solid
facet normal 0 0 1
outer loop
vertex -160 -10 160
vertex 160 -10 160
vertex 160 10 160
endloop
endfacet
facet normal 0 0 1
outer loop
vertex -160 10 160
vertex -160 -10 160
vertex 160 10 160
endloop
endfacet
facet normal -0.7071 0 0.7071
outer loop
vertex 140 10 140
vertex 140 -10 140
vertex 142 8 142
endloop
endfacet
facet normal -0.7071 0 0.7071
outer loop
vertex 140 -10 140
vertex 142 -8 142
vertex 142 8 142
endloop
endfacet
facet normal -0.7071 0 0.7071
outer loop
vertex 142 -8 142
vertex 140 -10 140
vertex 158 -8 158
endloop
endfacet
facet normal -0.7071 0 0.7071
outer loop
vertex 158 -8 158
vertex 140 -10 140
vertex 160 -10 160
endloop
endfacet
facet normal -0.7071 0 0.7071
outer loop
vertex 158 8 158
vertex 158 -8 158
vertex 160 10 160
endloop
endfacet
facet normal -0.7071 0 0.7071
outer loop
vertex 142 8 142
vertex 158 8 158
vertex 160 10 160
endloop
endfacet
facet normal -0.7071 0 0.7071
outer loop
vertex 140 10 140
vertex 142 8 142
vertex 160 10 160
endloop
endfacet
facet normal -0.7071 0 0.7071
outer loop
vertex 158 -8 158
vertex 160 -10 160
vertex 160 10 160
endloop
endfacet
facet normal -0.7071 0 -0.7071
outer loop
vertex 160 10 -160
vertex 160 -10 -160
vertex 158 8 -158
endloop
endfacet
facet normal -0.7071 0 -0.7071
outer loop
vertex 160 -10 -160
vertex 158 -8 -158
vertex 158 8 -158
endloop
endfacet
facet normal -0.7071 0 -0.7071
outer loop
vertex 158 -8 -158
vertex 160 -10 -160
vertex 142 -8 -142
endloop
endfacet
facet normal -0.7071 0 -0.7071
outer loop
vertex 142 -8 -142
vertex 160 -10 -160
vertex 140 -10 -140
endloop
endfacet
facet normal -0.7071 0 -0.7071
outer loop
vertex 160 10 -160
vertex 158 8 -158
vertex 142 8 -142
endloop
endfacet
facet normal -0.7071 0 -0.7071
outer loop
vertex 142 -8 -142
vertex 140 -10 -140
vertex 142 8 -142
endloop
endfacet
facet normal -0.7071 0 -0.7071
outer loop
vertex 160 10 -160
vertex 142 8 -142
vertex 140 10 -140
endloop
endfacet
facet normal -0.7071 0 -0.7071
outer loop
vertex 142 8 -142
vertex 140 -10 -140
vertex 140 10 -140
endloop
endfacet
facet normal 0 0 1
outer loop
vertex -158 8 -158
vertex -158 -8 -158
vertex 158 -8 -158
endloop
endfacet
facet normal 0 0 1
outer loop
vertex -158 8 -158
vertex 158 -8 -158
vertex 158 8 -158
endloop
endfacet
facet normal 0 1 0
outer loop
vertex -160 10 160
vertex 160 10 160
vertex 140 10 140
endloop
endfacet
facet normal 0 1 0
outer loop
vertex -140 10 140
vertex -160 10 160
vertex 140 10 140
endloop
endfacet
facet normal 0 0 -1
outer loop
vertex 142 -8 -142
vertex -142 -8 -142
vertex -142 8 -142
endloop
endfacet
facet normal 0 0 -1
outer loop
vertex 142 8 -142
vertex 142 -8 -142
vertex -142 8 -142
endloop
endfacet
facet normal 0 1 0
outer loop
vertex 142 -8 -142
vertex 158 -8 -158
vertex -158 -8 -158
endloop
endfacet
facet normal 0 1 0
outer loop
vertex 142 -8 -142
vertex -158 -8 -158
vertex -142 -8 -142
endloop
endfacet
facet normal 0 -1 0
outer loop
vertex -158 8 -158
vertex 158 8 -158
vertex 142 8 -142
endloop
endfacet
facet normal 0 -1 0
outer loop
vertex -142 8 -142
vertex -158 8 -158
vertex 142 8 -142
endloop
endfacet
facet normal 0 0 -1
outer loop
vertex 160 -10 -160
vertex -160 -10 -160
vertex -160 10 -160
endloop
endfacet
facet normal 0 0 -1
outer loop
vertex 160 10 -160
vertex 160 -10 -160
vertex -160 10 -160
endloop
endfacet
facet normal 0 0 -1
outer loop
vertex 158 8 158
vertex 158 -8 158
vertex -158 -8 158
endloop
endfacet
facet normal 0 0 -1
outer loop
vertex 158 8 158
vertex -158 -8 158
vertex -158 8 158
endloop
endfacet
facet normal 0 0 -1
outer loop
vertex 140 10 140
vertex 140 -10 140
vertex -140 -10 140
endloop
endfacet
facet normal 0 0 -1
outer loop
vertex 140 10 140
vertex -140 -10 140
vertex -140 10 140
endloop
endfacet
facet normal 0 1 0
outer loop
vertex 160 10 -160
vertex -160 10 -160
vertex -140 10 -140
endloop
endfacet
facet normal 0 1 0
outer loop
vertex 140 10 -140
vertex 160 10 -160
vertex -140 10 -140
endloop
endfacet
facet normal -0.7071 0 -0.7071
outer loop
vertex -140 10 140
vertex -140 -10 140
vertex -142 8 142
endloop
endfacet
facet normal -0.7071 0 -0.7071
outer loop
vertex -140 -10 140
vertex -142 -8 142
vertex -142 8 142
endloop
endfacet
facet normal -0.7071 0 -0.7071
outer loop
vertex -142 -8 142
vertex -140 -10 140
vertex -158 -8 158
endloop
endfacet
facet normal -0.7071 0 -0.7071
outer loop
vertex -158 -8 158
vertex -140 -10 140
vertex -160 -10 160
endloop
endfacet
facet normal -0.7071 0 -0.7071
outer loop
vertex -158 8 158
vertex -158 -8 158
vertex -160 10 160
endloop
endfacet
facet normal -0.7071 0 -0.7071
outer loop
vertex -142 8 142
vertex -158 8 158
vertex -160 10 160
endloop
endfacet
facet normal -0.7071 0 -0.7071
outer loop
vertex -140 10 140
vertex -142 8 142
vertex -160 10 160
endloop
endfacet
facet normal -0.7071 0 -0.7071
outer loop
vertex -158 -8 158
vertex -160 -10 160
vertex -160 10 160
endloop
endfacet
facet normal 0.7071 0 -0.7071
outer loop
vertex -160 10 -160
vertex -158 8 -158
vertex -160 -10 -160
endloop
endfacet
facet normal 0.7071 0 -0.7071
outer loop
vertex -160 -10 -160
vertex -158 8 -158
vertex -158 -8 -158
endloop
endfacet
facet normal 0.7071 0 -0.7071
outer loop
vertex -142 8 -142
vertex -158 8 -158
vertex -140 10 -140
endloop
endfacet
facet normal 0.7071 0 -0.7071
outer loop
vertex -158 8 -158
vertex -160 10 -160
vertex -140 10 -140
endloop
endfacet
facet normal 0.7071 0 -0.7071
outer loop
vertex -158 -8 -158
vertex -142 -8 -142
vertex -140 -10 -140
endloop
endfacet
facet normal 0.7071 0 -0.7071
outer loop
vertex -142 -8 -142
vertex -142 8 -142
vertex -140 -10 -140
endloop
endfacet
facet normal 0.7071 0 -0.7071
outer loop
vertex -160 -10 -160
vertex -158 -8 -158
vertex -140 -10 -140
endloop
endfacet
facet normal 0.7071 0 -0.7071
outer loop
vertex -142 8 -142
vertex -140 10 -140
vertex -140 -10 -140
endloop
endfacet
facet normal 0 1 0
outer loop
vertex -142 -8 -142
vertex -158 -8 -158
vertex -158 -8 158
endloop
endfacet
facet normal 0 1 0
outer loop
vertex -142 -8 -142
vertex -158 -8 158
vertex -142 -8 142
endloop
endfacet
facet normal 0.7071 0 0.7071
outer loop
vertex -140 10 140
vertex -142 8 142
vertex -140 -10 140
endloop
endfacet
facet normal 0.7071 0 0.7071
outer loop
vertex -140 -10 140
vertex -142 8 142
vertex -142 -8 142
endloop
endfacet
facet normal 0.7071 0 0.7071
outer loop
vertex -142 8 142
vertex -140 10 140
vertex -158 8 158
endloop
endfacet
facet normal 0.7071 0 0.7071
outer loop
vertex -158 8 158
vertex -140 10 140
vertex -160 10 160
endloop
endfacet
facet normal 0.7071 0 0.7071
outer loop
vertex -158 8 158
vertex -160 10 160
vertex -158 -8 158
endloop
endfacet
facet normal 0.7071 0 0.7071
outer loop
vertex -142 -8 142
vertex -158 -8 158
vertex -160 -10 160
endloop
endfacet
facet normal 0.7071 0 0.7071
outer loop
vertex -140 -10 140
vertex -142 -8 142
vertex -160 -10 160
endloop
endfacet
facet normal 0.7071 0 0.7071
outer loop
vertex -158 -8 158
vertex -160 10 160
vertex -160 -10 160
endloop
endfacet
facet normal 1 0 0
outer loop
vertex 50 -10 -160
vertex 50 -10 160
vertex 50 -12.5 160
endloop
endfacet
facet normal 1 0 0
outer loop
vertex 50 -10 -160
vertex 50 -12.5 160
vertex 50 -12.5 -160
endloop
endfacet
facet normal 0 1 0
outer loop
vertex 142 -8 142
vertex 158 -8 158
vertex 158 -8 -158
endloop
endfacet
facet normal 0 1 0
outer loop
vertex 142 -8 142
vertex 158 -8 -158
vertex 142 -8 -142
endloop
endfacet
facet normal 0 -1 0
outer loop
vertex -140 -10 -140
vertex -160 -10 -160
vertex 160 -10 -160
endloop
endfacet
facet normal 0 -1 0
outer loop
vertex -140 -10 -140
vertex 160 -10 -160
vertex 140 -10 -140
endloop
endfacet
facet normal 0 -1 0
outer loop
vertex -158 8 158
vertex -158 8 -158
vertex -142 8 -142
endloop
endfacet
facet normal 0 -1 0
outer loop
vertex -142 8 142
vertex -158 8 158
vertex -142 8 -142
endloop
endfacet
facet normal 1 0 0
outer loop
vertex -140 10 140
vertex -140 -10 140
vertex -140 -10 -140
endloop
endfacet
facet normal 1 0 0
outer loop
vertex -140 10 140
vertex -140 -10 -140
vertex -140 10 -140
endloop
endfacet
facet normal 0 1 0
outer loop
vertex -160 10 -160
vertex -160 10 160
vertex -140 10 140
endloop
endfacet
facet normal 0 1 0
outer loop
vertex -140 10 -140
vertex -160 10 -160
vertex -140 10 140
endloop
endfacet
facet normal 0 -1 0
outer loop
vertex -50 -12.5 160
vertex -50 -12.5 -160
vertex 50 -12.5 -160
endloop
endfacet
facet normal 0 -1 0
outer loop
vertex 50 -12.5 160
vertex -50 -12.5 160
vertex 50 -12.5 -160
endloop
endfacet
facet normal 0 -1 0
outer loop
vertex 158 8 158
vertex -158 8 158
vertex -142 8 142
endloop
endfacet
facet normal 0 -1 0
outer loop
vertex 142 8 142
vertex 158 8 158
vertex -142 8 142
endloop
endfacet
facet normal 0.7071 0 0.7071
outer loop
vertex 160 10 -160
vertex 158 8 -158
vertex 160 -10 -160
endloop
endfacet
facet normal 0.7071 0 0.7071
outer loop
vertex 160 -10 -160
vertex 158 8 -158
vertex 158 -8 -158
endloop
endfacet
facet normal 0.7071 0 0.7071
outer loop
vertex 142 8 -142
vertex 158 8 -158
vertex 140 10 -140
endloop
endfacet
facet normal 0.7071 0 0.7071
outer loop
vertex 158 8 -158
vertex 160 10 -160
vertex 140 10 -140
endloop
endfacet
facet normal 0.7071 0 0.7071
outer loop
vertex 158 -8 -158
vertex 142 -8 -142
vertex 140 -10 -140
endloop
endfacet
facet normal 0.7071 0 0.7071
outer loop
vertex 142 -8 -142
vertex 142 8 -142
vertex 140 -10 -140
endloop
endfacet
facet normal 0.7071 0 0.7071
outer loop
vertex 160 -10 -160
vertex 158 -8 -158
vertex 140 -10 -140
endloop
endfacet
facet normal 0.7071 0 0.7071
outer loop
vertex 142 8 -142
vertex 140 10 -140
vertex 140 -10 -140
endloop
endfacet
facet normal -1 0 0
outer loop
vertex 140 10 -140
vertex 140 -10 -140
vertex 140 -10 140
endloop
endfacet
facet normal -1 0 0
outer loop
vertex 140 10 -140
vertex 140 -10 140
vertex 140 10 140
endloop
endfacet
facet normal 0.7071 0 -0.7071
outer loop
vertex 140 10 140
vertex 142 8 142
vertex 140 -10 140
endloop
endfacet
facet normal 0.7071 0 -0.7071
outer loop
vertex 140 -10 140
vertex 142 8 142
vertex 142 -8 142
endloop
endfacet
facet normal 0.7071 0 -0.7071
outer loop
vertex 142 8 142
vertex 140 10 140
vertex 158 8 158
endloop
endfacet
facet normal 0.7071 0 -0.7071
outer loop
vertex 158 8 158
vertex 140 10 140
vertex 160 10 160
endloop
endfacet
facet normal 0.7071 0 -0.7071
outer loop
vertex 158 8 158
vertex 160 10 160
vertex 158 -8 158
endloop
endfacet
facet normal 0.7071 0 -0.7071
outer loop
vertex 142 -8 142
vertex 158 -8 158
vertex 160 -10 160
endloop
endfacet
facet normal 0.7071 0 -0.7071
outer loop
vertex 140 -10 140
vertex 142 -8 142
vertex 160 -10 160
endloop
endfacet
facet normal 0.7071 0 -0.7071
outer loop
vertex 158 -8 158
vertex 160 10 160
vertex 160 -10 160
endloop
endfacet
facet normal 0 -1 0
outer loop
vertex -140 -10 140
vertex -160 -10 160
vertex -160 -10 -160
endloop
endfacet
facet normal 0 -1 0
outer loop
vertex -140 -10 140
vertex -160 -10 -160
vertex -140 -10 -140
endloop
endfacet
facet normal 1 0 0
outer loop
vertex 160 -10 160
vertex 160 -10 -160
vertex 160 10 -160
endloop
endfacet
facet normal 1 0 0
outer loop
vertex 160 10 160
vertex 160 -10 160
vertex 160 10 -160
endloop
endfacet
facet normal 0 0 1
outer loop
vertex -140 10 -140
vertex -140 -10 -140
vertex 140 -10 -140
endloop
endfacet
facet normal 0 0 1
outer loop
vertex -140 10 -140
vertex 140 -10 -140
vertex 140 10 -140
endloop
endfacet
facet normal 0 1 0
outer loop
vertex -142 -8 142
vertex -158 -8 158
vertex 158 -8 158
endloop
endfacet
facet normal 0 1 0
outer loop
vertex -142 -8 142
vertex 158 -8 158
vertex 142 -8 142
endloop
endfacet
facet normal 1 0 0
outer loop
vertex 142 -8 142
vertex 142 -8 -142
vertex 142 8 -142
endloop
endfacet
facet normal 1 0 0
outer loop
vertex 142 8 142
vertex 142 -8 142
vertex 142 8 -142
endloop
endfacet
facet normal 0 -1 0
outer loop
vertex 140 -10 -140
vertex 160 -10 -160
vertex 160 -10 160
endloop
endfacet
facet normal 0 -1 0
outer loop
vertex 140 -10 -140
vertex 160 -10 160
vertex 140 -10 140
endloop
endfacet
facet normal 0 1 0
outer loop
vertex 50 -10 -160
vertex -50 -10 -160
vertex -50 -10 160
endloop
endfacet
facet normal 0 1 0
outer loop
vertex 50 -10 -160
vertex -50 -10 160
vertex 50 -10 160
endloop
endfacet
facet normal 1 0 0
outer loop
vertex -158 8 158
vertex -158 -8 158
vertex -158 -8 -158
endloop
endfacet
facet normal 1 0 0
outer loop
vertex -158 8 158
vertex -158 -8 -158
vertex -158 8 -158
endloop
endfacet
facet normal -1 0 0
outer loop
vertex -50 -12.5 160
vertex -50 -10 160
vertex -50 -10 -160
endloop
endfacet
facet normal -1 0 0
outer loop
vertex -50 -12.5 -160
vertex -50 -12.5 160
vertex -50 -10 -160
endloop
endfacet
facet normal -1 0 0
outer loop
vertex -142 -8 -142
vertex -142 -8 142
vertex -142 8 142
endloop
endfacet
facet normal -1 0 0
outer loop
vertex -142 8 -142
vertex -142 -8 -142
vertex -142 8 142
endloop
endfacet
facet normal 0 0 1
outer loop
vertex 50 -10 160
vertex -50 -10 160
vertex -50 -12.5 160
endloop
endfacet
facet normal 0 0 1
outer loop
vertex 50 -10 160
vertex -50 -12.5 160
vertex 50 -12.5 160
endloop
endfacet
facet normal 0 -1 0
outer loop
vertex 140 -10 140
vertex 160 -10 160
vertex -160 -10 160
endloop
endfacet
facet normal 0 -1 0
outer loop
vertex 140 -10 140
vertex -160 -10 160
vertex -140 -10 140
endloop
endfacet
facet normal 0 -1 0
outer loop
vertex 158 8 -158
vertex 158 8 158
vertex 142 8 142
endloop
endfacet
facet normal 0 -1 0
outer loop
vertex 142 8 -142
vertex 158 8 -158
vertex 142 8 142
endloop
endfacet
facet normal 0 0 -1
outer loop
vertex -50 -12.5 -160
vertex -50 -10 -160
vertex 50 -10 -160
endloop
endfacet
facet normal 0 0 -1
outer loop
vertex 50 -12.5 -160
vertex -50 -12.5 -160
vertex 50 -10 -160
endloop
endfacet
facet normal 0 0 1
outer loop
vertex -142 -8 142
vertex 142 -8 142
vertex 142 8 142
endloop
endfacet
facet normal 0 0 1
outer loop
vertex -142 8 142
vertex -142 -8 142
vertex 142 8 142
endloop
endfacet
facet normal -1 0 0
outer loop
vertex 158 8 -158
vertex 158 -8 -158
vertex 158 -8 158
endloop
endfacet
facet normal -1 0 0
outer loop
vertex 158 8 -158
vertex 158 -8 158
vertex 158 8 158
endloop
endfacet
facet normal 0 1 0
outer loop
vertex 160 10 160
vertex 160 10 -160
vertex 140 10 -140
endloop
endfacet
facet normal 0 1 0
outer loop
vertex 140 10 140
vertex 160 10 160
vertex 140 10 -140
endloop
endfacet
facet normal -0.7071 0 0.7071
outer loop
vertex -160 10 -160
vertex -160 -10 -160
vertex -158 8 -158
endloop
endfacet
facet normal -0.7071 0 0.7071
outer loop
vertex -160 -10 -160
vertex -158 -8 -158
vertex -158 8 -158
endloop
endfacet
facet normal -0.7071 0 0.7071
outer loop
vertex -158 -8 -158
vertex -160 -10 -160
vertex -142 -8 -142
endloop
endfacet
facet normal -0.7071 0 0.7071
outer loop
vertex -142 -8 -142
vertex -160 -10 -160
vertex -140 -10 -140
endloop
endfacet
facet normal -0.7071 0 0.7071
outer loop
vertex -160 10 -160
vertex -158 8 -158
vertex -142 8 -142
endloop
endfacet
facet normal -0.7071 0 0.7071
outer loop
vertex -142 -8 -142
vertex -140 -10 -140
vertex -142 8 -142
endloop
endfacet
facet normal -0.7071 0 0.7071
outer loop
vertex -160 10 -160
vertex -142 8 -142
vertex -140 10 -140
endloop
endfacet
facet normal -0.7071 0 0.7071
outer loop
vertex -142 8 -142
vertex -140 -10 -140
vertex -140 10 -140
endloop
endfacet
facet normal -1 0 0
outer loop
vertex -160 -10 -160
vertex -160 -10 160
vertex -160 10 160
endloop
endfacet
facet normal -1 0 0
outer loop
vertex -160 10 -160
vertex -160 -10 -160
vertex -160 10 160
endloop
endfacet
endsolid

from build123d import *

# Parameters (mm, degrees)
TUBO_CUADRADO_20_X_20_X_2_2_DEPTH      = 315.142135624
TUBO_CUADRADO_20_X_20_X_2_2_DEPTH_BACK = 15.142135624
SKETCH1_W                              = 20
SKETCH1_H                              = 20
SKETCH1_W_2                            = 16
SKETCH1_H_2                            = 16
SKETCH1_ON_SEGMENT_2_W                 = 20
SKETCH1_ON_SEGMENT_2_H                 = 20
SKETCH1_ON_SEGMENT_2_W_2               = 16
SKETCH1_ON_SEGMENT_2_H_2               = 16
TUBO_CUADRADO_20_X_20_X_2_2_2_DEPTH    = 330.284271247
SKETCH1_ON_SEGMENT_3_W                 = 20
SKETCH1_ON_SEGMENT_3_H                 = 20
SKETCH1_ON_SEGMENT_3_W_2               = 16
SKETCH1_ON_SEGMENT_3_H_2               = 16
TUBO_CUADRADO_20_X_20_X_2_2_3_DEPTH    = 330.284271247
SKETCH1_ON_SEGMENT_4_W                 = 20
SKETCH1_ON_SEGMENT_4_H                 = 20
SKETCH1_ON_SEGMENT_4_W_2               = 16
SKETCH1_ON_SEGMENT_4_H_2               = 16
TUBO_CUADRADO_20_X_20_X_2_2_4_DEPTH    = 330.284271247
CROQUIS3_W                             = 100
CROQUIS3_H                             = 320
SALIENTE_EXTRUIR1_DEPTH                = 2.5


with BuildPart() as part:
    # Sketch1 → Tubo cuadrado 20 X 20 X 2(2) (new, two sides: drawn at the far end of the back side and taken through both)
    with BuildSketch(Plane(origin=(-150, 0, -150), x_dir=(1, 0, 0), z_dir=(0, 0, 1)).offset(-TUBO_CUADRADO_20_X_20_X_2_2_DEPTH_BACK)):
        Rectangle(SKETCH1_W, SKETCH1_H)
        Rectangle(SKETCH1_W_2, SKETCH1_H_2, mode=Mode.SUBTRACT)
    extrude(amount=TUBO_CUADRADO_20_X_20_X_2_2_DEPTH + TUBO_CUADRADO_20_X_20_X_2_2_DEPTH_BACK)

    # Tubo cuadrado 20 X 20 X 2(2) mitre 1
    split(bisect_by=Plane(origin=(-150, 0, -150), x_dir=(0, -1, 0), z_dir=(-0.707106781, 0, 0.707106781)), keep=Keep.TOP)

    # Tubo cuadrado 20 X 20 X 2(2) mitre 2
    split(bisect_by=Plane(origin=(-150, 0, 150), x_dir=(0, -1, 0), z_dir=(-0.707106781, 0, -0.707106781)), keep=Keep.TOP)


with BuildPart() as body_2:
    # Sketch1 on segment 2 (carried to segment 2) → Tubo cuadrado 20 X 20 X 2_2 2 (new body)
    with BuildSketch(Plane(origin=(-165.142135624, 0, 150), x_dir=(0, 0, -1), z_dir=(1, 0, 0))):
        Rectangle(SKETCH1_ON_SEGMENT_2_W, SKETCH1_ON_SEGMENT_2_H)
        Rectangle(SKETCH1_ON_SEGMENT_2_W_2, SKETCH1_ON_SEGMENT_2_H_2, mode=Mode.SUBTRACT)
    extrude(amount=TUBO_CUADRADO_20_X_20_X_2_2_2_DEPTH)

    # Tubo cuadrado 20 X 20 X 2_2 2 mitre 1
    split(bisect_by=Plane(origin=(-150, 0, 150), x_dir=(0, 1, 0), z_dir=(0.707106781, 0, 0.707106781)), keep=Keep.TOP)

    # Tubo cuadrado 20 X 20 X 2_2 2 mitre 2
    split(bisect_by=Plane(origin=(150, 0, 150), x_dir=(0, -1, 0), z_dir=(-0.707106781, 0, 0.707106781)), keep=Keep.TOP)


with BuildPart() as body_3:
    # Sketch1 on segment 3 (carried to segment 3) → Tubo cuadrado 20 X 20 X 2_2 3 (new body)
    with BuildSketch(Plane(origin=(150, 0, 165.142135624), x_dir=(-1, 0, 0), z_dir=(0, 0, -1))):
        Rectangle(SKETCH1_ON_SEGMENT_3_W, SKETCH1_ON_SEGMENT_3_H)
        Rectangle(SKETCH1_ON_SEGMENT_3_W_2, SKETCH1_ON_SEGMENT_3_H_2, mode=Mode.SUBTRACT)
    extrude(amount=TUBO_CUADRADO_20_X_20_X_2_2_3_DEPTH)

    # Tubo cuadrado 20 X 20 X 2_2 3 mitre 1
    split(bisect_by=Plane(origin=(150, 0, -150), x_dir=(0, 1, 0), z_dir=(0.707106781, 0, 0.707106781)), keep=Keep.TOP)

    # Tubo cuadrado 20 X 20 X 2_2 3 mitre 2
    split(bisect_by=Plane(origin=(150, 0, 150), x_dir=(0, 1, 0), z_dir=(0.707106781, 0, -0.707106781)), keep=Keep.TOP)


with BuildPart() as body_4:
    # Sketch1 on segment 4 (carried to segment 4) → Tubo cuadrado 20 X 20 X 2_2 4 (new body)
    with BuildSketch(Plane(origin=(165.142135624, 0, -150), x_dir=(0, 0, 1), z_dir=(-1, 0, 0))):
        Rectangle(SKETCH1_ON_SEGMENT_4_W, SKETCH1_ON_SEGMENT_4_H)
        Rectangle(SKETCH1_ON_SEGMENT_4_W_2, SKETCH1_ON_SEGMENT_4_H_2, mode=Mode.SUBTRACT)
    extrude(amount=TUBO_CUADRADO_20_X_20_X_2_2_4_DEPTH)

    # Tubo cuadrado 20 X 20 X 2_2 4 mitre 1
    split(bisect_by=Plane(origin=(-150, 0, -150), x_dir=(0, 1, 0), z_dir=(0.707106781, 0, -0.707106781)), keep=Keep.TOP)

    # Tubo cuadrado 20 X 20 X 2_2 4 mitre 2
    split(bisect_by=Plane(origin=(150, 0, -150), x_dir=(0, -1, 0), z_dir=(-0.707106781, 0, -0.707106781)), keep=Keep.TOP)


with BuildPart() as body_5:
    # Croquis3 → Saliente-Extruir1 (new body)
    with BuildSketch(Plane(origin=(0, -10, 0), x_dir=(1, 0, 0), z_dir=(0, 1, 0))):
        Rectangle(CROQUIS3_W, CROQUIS3_H)
    extrude(amount=-SALIENTE_EXTRUIR1_DEPTH)


solid = Compound([part.part, body_2.part, body_3.part, body_4.part, body_5.part])
